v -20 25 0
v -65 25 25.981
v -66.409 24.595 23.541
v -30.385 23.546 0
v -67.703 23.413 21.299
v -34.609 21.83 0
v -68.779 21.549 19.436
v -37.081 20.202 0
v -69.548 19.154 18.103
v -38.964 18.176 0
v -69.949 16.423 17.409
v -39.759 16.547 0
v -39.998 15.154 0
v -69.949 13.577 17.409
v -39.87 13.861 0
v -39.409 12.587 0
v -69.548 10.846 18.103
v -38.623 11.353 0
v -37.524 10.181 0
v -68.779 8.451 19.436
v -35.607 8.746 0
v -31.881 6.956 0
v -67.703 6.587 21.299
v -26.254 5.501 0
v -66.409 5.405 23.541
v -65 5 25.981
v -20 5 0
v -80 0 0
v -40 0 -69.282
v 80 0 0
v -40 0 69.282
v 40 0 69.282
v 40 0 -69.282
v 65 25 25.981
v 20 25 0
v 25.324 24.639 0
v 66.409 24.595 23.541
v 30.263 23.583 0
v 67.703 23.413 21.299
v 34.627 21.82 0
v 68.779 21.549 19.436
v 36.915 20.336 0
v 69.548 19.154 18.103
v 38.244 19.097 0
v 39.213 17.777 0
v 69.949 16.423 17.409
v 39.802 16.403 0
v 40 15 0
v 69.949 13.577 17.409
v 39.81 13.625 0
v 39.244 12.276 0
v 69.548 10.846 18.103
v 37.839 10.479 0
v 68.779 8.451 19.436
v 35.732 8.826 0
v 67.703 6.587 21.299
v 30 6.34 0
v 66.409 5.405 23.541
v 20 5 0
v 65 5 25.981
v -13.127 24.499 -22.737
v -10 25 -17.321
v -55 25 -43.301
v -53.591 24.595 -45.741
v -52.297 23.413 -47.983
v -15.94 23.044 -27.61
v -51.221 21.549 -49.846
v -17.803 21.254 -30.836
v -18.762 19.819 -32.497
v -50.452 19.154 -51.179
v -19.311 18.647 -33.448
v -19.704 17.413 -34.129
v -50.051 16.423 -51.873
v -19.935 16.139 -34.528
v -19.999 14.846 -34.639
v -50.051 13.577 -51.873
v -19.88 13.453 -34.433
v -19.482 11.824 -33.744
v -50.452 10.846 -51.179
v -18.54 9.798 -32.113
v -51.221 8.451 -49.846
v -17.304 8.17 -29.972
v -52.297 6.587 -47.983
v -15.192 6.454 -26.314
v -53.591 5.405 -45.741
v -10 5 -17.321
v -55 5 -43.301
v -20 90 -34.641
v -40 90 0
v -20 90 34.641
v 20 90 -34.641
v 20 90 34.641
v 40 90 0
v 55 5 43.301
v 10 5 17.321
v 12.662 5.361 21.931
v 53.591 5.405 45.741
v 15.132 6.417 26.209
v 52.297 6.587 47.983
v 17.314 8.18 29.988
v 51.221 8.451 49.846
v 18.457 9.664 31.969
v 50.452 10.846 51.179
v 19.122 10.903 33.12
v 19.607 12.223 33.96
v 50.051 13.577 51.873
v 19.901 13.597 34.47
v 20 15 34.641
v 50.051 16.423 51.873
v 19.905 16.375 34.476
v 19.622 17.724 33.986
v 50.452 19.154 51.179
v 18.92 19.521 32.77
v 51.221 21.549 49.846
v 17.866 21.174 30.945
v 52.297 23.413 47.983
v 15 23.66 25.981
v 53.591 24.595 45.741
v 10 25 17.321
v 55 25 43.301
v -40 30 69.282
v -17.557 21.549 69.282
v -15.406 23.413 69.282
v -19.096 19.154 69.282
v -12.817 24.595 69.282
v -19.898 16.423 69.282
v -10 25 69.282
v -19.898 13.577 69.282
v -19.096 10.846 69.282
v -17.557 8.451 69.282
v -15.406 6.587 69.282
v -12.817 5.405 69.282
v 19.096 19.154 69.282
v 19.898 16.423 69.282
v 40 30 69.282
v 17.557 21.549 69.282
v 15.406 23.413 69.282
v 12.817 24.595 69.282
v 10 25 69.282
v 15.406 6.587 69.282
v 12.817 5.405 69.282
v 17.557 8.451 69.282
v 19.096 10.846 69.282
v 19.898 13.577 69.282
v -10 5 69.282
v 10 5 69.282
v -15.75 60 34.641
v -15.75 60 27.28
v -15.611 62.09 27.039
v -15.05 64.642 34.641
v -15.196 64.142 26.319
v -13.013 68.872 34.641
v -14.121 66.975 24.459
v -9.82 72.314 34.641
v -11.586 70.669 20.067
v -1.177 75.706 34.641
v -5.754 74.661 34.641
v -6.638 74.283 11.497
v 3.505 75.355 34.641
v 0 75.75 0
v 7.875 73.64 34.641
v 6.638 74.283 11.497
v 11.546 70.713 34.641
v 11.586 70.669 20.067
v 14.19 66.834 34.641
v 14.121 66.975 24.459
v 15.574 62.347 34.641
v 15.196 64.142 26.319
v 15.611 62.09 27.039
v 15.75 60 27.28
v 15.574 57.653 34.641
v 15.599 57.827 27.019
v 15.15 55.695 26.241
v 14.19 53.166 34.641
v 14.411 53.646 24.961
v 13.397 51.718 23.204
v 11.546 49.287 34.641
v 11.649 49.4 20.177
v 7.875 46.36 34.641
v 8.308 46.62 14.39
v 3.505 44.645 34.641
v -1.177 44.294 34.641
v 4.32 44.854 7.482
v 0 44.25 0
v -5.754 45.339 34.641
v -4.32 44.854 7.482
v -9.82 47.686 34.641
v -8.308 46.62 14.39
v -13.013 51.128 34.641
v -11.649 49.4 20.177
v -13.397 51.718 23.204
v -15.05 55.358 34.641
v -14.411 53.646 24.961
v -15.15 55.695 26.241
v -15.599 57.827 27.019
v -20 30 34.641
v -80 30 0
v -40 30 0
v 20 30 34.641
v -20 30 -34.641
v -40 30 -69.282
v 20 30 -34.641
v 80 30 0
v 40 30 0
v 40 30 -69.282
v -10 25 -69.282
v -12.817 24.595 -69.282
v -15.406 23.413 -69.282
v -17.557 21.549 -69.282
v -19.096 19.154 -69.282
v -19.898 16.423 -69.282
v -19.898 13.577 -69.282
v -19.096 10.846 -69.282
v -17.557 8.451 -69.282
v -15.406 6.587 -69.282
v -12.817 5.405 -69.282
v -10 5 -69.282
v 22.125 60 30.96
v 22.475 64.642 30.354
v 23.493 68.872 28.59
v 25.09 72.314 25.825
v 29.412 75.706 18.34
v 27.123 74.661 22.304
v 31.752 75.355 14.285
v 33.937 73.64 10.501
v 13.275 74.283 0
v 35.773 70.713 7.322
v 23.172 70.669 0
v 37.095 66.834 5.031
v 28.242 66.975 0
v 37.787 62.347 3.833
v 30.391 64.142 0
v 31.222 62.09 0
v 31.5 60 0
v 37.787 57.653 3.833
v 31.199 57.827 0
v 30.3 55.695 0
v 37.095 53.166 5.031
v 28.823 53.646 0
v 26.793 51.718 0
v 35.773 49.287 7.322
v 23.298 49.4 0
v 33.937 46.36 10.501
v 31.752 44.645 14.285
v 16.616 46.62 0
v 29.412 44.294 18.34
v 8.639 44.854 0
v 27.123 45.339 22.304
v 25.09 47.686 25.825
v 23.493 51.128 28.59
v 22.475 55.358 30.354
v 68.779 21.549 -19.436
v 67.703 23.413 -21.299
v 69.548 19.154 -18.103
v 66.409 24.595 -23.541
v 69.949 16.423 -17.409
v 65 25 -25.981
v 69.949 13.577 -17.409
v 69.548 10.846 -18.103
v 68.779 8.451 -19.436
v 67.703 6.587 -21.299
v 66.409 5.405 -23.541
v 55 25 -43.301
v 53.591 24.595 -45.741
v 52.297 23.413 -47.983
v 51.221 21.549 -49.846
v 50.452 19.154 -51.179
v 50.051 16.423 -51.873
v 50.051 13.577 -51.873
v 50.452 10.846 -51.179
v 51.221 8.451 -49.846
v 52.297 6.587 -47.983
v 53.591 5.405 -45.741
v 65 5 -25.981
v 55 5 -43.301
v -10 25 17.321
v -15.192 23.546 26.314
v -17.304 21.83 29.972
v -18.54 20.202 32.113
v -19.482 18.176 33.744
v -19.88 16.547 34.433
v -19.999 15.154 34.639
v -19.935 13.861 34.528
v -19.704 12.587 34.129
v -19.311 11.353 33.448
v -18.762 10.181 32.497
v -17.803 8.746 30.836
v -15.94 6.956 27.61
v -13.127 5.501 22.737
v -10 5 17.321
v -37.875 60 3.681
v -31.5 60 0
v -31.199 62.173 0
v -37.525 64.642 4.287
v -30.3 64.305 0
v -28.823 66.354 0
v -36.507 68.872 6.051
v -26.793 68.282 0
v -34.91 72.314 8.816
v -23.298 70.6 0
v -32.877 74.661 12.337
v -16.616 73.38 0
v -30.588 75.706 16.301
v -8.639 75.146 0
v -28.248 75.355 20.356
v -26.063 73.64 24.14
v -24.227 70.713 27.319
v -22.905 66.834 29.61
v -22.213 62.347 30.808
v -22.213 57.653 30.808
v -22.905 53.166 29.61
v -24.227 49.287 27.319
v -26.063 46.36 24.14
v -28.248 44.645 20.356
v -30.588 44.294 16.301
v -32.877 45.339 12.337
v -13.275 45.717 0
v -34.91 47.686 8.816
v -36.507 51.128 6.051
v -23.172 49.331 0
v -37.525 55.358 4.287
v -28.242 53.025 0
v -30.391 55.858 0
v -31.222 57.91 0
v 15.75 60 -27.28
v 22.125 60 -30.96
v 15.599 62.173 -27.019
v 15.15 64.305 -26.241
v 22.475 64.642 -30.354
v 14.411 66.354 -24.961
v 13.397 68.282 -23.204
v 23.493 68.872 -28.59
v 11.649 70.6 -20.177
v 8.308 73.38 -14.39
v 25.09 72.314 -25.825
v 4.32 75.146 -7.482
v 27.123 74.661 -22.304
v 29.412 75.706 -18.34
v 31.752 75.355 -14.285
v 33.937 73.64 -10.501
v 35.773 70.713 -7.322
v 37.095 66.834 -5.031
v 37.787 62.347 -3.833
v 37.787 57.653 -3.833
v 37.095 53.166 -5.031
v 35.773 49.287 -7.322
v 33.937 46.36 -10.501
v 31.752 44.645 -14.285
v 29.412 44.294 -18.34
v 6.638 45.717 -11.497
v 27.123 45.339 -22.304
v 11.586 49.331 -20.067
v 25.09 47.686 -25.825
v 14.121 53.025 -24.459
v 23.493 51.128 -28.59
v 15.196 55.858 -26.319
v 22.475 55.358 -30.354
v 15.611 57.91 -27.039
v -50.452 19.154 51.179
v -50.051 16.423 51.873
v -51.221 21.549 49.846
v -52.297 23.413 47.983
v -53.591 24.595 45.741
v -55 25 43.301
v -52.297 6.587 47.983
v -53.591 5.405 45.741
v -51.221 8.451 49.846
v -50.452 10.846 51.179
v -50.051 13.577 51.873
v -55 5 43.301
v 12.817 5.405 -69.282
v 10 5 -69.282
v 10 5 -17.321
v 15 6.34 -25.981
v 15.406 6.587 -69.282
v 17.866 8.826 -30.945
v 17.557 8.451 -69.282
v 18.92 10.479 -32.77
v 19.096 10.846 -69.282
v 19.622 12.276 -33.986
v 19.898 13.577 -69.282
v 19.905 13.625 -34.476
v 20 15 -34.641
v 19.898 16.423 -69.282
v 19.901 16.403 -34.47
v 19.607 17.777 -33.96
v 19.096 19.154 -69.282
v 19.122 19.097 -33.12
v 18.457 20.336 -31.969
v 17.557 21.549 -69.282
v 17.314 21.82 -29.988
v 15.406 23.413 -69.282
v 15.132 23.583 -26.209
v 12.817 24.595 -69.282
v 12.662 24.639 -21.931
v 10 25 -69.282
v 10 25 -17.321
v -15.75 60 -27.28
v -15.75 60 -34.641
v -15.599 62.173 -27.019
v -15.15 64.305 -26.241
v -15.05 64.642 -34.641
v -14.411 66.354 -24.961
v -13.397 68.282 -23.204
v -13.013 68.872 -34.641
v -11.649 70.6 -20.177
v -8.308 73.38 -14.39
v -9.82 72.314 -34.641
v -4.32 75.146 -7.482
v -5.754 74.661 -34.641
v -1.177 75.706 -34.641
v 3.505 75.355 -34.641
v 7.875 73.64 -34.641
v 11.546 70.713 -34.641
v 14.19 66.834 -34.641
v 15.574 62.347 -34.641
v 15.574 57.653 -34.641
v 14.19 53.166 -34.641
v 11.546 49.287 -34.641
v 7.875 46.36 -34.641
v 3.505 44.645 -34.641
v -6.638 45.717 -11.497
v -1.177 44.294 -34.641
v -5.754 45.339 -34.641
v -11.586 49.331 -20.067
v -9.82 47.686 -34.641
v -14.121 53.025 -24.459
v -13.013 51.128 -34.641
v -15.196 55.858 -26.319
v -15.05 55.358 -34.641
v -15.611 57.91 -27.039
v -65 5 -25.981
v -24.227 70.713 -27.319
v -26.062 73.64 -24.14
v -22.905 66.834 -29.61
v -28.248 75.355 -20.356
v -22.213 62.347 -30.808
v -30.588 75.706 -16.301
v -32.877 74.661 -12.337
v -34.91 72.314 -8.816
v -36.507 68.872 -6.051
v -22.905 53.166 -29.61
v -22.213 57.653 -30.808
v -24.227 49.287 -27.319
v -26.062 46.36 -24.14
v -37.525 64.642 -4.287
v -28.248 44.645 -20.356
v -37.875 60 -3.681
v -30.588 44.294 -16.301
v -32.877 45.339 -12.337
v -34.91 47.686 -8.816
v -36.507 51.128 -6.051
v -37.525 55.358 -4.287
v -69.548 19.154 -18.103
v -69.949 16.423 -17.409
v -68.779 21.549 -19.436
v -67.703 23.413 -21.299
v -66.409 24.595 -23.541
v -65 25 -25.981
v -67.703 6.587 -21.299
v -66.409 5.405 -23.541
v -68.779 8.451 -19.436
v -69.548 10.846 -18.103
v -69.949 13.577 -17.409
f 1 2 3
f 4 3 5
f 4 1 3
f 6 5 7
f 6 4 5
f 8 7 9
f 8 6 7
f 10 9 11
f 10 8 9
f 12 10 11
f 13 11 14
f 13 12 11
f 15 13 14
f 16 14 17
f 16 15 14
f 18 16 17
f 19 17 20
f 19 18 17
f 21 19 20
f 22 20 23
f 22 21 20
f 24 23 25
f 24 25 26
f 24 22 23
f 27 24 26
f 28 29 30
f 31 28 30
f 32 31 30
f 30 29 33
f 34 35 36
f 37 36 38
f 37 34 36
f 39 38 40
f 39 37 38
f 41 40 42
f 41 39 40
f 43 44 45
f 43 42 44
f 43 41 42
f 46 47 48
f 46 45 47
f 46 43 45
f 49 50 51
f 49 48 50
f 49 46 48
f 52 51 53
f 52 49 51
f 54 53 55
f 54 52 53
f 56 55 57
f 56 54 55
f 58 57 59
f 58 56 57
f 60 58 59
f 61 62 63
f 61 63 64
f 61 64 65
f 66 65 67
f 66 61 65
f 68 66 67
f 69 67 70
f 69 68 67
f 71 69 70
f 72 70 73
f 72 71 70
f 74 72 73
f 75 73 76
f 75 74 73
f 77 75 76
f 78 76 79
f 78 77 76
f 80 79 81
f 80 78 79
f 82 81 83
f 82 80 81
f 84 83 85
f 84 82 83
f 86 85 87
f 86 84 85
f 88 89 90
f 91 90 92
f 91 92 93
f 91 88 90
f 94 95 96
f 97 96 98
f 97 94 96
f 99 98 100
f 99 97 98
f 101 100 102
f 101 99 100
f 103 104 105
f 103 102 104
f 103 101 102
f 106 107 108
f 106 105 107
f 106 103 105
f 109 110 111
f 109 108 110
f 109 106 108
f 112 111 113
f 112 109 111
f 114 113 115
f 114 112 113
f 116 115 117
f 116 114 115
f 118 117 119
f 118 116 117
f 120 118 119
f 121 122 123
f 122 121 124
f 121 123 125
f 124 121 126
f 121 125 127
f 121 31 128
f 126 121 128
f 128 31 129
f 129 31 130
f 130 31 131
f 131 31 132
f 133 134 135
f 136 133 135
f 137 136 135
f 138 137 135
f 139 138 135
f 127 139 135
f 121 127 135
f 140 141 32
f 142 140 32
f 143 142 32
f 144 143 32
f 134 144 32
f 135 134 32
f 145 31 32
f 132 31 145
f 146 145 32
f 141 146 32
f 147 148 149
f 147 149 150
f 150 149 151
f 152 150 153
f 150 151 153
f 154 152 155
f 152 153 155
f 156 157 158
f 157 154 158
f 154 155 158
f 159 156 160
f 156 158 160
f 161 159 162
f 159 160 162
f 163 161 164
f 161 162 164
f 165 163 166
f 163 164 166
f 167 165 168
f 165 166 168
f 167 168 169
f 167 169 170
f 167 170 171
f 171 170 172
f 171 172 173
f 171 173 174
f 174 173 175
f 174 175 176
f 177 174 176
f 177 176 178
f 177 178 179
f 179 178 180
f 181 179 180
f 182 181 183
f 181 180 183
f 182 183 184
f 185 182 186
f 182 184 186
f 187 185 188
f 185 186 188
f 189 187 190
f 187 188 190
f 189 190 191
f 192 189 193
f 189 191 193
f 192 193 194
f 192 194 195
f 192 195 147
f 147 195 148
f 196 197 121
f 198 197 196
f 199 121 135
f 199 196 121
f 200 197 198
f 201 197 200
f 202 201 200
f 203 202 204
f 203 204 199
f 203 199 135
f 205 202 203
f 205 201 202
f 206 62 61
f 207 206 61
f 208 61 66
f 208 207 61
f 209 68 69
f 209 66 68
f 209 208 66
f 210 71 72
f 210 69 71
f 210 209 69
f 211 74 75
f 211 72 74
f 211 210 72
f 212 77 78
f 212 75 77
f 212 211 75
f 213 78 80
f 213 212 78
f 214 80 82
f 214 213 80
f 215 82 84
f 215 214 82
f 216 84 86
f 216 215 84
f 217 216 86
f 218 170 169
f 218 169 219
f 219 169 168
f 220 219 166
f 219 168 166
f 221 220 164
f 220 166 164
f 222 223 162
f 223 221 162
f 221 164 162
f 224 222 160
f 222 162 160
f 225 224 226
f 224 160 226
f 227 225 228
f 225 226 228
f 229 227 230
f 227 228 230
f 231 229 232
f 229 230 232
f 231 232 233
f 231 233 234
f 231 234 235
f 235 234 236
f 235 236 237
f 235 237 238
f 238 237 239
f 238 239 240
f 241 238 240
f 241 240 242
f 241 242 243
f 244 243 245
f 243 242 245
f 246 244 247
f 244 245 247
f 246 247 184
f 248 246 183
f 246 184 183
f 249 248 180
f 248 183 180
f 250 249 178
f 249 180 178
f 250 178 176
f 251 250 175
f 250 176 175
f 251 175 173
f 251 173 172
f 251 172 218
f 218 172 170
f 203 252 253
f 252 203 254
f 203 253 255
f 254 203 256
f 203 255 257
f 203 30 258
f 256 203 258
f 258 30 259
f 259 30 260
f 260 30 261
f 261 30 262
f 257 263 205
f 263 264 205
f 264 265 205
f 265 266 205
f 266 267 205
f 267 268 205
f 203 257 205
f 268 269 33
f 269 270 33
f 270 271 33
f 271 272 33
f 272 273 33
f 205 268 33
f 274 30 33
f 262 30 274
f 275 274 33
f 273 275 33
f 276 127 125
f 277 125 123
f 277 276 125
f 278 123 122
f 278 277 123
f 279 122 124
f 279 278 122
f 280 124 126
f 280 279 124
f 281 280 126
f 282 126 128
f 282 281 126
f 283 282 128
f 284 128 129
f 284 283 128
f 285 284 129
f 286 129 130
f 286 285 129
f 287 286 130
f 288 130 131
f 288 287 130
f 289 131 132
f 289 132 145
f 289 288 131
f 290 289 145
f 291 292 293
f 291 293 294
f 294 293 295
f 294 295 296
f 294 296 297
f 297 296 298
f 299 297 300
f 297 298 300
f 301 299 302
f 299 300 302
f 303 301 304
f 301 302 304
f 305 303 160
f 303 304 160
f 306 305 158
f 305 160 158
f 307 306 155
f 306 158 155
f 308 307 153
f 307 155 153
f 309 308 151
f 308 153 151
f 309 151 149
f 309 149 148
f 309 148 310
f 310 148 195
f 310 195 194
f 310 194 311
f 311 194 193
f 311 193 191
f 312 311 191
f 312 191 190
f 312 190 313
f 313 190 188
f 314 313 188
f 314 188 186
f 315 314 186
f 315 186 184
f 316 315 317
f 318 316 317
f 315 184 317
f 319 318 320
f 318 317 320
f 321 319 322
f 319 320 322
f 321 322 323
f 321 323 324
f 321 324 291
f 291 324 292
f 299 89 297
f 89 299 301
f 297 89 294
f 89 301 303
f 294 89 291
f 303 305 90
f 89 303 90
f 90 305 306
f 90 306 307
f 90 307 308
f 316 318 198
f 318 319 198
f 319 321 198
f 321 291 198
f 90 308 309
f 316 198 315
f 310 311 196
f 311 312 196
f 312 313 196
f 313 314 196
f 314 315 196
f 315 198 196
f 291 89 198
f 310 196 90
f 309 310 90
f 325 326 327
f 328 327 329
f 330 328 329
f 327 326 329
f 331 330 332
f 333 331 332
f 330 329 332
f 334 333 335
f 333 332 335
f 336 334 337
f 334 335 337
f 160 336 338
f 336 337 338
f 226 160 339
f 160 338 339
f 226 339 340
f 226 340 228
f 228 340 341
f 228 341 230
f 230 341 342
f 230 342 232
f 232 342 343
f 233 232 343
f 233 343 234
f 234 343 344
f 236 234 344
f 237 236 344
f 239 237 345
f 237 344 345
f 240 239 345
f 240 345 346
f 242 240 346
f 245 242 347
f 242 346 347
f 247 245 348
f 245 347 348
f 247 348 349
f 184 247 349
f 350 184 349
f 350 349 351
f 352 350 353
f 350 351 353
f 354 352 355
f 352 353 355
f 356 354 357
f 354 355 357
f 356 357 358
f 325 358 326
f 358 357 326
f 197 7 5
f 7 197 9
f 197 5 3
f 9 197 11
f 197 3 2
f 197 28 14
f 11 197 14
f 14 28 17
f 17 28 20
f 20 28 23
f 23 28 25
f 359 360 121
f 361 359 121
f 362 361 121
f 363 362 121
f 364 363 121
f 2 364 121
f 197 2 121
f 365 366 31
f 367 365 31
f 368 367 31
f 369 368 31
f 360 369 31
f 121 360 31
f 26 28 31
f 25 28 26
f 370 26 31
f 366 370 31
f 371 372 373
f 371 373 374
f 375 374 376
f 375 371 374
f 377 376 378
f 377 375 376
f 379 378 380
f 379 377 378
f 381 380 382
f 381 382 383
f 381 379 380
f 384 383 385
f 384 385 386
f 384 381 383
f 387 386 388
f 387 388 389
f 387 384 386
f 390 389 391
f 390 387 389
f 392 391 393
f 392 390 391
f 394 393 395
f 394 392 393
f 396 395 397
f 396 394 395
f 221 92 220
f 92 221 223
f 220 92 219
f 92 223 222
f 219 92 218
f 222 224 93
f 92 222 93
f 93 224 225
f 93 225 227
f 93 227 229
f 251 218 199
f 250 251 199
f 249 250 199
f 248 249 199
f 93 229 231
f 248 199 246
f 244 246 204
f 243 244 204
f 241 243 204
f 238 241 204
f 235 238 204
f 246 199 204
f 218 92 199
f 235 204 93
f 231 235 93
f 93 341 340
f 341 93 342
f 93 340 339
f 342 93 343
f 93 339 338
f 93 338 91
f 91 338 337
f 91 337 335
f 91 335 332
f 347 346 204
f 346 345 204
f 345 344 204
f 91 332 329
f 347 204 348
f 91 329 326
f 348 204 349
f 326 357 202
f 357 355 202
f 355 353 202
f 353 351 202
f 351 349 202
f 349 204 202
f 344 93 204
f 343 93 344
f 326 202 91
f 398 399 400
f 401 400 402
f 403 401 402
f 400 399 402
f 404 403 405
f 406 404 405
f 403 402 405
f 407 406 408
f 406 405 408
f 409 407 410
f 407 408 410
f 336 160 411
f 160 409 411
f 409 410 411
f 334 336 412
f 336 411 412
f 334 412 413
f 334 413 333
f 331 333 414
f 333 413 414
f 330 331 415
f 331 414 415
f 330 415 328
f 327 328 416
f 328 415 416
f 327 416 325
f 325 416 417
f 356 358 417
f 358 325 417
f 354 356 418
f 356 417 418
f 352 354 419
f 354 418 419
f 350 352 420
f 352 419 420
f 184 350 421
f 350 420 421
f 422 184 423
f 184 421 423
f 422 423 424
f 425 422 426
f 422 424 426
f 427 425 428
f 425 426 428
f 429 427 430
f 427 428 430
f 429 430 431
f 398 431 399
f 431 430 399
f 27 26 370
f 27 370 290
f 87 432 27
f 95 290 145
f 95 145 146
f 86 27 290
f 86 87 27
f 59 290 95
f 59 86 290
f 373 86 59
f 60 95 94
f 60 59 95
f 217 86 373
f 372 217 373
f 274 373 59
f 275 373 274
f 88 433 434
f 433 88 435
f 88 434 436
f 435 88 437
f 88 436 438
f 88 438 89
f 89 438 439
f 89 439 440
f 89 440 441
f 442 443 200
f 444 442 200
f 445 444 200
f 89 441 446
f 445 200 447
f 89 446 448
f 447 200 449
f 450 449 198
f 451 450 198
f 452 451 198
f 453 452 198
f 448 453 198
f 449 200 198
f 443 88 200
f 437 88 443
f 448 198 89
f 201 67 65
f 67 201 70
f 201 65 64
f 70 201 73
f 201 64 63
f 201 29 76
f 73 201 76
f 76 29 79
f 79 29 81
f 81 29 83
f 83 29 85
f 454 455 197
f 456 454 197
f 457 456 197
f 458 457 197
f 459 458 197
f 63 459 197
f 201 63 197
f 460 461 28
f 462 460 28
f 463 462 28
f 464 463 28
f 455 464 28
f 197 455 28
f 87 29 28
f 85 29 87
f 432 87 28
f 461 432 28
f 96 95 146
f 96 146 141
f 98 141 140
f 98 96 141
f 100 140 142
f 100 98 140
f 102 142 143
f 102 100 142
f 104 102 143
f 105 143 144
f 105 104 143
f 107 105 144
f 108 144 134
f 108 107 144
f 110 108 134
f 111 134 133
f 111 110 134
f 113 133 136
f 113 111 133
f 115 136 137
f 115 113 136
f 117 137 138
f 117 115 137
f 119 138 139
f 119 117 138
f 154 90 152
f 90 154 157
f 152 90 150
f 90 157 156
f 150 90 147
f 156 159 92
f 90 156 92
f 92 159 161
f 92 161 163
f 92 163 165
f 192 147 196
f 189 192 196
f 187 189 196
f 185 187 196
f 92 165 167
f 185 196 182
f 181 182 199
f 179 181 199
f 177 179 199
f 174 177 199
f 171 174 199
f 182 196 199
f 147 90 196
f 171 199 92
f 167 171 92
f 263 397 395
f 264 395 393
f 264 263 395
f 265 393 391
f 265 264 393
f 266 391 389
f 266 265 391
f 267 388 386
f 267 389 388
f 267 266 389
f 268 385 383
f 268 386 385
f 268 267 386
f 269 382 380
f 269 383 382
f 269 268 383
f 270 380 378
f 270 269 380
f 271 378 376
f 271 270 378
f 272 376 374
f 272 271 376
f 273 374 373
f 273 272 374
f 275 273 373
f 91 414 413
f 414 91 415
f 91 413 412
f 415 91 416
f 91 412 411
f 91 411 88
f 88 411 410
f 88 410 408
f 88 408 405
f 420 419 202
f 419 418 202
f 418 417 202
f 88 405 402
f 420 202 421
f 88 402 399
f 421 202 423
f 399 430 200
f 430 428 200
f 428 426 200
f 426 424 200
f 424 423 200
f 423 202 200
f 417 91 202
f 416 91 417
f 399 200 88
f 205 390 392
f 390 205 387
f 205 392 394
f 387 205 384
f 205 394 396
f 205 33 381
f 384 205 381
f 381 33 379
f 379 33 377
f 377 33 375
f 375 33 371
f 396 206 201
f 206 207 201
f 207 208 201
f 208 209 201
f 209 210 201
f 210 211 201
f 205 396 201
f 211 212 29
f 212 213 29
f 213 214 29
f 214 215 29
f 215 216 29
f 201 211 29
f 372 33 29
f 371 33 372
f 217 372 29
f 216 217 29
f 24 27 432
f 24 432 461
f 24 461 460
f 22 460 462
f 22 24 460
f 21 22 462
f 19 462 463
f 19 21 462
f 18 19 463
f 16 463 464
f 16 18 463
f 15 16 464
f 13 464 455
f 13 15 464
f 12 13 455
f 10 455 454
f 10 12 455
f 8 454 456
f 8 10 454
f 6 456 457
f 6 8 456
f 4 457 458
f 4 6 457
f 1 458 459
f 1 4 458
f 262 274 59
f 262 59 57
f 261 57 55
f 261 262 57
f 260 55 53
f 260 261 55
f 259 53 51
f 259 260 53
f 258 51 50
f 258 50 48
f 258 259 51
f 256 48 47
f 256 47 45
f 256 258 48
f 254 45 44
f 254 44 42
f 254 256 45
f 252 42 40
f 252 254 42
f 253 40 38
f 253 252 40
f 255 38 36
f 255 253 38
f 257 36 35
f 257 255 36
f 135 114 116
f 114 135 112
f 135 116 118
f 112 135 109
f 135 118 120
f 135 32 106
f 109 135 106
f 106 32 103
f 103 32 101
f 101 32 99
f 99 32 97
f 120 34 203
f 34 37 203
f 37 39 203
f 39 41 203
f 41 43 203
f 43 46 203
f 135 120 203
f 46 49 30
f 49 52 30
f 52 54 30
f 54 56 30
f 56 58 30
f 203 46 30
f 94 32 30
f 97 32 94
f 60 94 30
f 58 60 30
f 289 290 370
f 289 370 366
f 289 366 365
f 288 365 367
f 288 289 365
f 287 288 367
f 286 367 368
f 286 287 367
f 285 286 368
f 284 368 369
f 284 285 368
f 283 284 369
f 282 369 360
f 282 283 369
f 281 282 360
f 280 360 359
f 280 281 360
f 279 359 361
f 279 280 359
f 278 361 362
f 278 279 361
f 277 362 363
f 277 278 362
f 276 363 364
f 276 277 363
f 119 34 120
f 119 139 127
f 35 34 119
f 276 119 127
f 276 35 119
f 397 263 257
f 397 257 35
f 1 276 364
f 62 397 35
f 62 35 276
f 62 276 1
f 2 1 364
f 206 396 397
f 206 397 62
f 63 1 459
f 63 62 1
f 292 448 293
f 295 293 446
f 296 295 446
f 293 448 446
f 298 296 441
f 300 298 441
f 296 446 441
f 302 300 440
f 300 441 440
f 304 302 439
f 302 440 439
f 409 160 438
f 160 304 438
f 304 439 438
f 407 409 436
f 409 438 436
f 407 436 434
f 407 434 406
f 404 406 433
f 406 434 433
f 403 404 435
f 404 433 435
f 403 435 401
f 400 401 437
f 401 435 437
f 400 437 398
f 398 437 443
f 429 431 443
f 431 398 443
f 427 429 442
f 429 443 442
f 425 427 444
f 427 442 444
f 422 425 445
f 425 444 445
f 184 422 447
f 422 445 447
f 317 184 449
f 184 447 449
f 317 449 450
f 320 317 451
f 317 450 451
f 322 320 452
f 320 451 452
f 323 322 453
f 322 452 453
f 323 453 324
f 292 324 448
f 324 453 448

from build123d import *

# Parameters (mm, degrees)
SALIENTE_EXTRUIR1_DEPTH = 30
SALIENTE_EXTRUIR2_DEPTH = 90
CORTAR_EXTRUIR1_DEPTH   = 138.564065
MATRIZC1_COUNT          = 6
CROQUIS4_R              = 15.75
CORTAR_EXTRUIR2_DEPTH   = 103.923048
MATRIZC2_COUNT          = 6


with BuildPart() as part:
    # Croquis1 → Saliente-Extruir1 (new body)
    with BuildSketch(Plane(origin=(0, 0, 0), x_dir=(1, 0, 0), z_dir=(0, 1, 0))):
        Polygon((40, 69.282032303), (-40, 69.282032303), (-80, 0), (-40, -69.282032303), (40, -69.282032303), (80, 0), align=None)
    extrude(amount=SALIENTE_EXTRUIR1_DEPTH)

    # Croquis2 → Saliente-Extruir2 (add)
    with BuildSketch(Plane(origin=(0, 0, 0), x_dir=(1, 0, 0), z_dir=(0, 1, 0))):
        Polygon((20, 34.641016151), (-20, 34.641016151), (-40, 0), (-20, -34.641016151), (20, -34.641016151), (40, 0), align=None)
    extrude(amount=SALIENTE_EXTRUIR2_DEPTH)

    # Croquis3 → Cortar-Extruir1 (cut)
    with BuildSketch(Plane(origin=(60, 0, 34.641016151), x_dir=(0.5, 0, -0.866025404), z_dir=(0.866025404, 0, 0.5))):
        with BuildLine():
            Line((-10, 25), (10, 25))
            ThreePointArc((10, 25), (20, 15), (10, 5))
            Line((10, 5), (-10, 5))
            ThreePointArc((-10, 5), (-20, 15), (-10, 25))
        make_face()
    cortar_extruir1 = extrude(amount=-CORTAR_EXTRUIR1_DEPTH, mode=Mode.SUBTRACT)

    # MatrizC1: Cortar-Extruir1 ×6 about axis
    matrizc1_axis = Axis((0, 0, 0), (0, 1, 0))
    for i in range(1, MATRIZC1_COUNT):
        add(cortar_extruir1.rotate(matrizc1_axis, i * 360 / MATRIZC1_COUNT), mode=Mode.SUBTRACT)

    # Croquis4 → Cortar-Extruir2 (cut)
    with BuildSketch(Plane(origin=(30, 0, -17.320508076), x_dir=(-0.5, 0, -0.866025404), z_dir=(0.866025404, 0, -0.5))):
        with Locations((0, 60)):
            Circle(CROQUIS4_R)
    cortar_extruir2 = extrude(amount=-CORTAR_EXTRUIR2_DEPTH, mode=Mode.SUBTRACT)

    # MatrizC2: Cortar-Extruir2 ×6 about axis
    matrizc2_axis = Axis((0, 90, 0), (0, 1, 0))
    for i in range(1, MATRIZC2_COUNT):
        add(cortar_extruir2.rotate(matrizc2_axis, i * 360 / MATRIZC2_COUNT), mode=Mode.SUBTRACT)


solid = part.part
